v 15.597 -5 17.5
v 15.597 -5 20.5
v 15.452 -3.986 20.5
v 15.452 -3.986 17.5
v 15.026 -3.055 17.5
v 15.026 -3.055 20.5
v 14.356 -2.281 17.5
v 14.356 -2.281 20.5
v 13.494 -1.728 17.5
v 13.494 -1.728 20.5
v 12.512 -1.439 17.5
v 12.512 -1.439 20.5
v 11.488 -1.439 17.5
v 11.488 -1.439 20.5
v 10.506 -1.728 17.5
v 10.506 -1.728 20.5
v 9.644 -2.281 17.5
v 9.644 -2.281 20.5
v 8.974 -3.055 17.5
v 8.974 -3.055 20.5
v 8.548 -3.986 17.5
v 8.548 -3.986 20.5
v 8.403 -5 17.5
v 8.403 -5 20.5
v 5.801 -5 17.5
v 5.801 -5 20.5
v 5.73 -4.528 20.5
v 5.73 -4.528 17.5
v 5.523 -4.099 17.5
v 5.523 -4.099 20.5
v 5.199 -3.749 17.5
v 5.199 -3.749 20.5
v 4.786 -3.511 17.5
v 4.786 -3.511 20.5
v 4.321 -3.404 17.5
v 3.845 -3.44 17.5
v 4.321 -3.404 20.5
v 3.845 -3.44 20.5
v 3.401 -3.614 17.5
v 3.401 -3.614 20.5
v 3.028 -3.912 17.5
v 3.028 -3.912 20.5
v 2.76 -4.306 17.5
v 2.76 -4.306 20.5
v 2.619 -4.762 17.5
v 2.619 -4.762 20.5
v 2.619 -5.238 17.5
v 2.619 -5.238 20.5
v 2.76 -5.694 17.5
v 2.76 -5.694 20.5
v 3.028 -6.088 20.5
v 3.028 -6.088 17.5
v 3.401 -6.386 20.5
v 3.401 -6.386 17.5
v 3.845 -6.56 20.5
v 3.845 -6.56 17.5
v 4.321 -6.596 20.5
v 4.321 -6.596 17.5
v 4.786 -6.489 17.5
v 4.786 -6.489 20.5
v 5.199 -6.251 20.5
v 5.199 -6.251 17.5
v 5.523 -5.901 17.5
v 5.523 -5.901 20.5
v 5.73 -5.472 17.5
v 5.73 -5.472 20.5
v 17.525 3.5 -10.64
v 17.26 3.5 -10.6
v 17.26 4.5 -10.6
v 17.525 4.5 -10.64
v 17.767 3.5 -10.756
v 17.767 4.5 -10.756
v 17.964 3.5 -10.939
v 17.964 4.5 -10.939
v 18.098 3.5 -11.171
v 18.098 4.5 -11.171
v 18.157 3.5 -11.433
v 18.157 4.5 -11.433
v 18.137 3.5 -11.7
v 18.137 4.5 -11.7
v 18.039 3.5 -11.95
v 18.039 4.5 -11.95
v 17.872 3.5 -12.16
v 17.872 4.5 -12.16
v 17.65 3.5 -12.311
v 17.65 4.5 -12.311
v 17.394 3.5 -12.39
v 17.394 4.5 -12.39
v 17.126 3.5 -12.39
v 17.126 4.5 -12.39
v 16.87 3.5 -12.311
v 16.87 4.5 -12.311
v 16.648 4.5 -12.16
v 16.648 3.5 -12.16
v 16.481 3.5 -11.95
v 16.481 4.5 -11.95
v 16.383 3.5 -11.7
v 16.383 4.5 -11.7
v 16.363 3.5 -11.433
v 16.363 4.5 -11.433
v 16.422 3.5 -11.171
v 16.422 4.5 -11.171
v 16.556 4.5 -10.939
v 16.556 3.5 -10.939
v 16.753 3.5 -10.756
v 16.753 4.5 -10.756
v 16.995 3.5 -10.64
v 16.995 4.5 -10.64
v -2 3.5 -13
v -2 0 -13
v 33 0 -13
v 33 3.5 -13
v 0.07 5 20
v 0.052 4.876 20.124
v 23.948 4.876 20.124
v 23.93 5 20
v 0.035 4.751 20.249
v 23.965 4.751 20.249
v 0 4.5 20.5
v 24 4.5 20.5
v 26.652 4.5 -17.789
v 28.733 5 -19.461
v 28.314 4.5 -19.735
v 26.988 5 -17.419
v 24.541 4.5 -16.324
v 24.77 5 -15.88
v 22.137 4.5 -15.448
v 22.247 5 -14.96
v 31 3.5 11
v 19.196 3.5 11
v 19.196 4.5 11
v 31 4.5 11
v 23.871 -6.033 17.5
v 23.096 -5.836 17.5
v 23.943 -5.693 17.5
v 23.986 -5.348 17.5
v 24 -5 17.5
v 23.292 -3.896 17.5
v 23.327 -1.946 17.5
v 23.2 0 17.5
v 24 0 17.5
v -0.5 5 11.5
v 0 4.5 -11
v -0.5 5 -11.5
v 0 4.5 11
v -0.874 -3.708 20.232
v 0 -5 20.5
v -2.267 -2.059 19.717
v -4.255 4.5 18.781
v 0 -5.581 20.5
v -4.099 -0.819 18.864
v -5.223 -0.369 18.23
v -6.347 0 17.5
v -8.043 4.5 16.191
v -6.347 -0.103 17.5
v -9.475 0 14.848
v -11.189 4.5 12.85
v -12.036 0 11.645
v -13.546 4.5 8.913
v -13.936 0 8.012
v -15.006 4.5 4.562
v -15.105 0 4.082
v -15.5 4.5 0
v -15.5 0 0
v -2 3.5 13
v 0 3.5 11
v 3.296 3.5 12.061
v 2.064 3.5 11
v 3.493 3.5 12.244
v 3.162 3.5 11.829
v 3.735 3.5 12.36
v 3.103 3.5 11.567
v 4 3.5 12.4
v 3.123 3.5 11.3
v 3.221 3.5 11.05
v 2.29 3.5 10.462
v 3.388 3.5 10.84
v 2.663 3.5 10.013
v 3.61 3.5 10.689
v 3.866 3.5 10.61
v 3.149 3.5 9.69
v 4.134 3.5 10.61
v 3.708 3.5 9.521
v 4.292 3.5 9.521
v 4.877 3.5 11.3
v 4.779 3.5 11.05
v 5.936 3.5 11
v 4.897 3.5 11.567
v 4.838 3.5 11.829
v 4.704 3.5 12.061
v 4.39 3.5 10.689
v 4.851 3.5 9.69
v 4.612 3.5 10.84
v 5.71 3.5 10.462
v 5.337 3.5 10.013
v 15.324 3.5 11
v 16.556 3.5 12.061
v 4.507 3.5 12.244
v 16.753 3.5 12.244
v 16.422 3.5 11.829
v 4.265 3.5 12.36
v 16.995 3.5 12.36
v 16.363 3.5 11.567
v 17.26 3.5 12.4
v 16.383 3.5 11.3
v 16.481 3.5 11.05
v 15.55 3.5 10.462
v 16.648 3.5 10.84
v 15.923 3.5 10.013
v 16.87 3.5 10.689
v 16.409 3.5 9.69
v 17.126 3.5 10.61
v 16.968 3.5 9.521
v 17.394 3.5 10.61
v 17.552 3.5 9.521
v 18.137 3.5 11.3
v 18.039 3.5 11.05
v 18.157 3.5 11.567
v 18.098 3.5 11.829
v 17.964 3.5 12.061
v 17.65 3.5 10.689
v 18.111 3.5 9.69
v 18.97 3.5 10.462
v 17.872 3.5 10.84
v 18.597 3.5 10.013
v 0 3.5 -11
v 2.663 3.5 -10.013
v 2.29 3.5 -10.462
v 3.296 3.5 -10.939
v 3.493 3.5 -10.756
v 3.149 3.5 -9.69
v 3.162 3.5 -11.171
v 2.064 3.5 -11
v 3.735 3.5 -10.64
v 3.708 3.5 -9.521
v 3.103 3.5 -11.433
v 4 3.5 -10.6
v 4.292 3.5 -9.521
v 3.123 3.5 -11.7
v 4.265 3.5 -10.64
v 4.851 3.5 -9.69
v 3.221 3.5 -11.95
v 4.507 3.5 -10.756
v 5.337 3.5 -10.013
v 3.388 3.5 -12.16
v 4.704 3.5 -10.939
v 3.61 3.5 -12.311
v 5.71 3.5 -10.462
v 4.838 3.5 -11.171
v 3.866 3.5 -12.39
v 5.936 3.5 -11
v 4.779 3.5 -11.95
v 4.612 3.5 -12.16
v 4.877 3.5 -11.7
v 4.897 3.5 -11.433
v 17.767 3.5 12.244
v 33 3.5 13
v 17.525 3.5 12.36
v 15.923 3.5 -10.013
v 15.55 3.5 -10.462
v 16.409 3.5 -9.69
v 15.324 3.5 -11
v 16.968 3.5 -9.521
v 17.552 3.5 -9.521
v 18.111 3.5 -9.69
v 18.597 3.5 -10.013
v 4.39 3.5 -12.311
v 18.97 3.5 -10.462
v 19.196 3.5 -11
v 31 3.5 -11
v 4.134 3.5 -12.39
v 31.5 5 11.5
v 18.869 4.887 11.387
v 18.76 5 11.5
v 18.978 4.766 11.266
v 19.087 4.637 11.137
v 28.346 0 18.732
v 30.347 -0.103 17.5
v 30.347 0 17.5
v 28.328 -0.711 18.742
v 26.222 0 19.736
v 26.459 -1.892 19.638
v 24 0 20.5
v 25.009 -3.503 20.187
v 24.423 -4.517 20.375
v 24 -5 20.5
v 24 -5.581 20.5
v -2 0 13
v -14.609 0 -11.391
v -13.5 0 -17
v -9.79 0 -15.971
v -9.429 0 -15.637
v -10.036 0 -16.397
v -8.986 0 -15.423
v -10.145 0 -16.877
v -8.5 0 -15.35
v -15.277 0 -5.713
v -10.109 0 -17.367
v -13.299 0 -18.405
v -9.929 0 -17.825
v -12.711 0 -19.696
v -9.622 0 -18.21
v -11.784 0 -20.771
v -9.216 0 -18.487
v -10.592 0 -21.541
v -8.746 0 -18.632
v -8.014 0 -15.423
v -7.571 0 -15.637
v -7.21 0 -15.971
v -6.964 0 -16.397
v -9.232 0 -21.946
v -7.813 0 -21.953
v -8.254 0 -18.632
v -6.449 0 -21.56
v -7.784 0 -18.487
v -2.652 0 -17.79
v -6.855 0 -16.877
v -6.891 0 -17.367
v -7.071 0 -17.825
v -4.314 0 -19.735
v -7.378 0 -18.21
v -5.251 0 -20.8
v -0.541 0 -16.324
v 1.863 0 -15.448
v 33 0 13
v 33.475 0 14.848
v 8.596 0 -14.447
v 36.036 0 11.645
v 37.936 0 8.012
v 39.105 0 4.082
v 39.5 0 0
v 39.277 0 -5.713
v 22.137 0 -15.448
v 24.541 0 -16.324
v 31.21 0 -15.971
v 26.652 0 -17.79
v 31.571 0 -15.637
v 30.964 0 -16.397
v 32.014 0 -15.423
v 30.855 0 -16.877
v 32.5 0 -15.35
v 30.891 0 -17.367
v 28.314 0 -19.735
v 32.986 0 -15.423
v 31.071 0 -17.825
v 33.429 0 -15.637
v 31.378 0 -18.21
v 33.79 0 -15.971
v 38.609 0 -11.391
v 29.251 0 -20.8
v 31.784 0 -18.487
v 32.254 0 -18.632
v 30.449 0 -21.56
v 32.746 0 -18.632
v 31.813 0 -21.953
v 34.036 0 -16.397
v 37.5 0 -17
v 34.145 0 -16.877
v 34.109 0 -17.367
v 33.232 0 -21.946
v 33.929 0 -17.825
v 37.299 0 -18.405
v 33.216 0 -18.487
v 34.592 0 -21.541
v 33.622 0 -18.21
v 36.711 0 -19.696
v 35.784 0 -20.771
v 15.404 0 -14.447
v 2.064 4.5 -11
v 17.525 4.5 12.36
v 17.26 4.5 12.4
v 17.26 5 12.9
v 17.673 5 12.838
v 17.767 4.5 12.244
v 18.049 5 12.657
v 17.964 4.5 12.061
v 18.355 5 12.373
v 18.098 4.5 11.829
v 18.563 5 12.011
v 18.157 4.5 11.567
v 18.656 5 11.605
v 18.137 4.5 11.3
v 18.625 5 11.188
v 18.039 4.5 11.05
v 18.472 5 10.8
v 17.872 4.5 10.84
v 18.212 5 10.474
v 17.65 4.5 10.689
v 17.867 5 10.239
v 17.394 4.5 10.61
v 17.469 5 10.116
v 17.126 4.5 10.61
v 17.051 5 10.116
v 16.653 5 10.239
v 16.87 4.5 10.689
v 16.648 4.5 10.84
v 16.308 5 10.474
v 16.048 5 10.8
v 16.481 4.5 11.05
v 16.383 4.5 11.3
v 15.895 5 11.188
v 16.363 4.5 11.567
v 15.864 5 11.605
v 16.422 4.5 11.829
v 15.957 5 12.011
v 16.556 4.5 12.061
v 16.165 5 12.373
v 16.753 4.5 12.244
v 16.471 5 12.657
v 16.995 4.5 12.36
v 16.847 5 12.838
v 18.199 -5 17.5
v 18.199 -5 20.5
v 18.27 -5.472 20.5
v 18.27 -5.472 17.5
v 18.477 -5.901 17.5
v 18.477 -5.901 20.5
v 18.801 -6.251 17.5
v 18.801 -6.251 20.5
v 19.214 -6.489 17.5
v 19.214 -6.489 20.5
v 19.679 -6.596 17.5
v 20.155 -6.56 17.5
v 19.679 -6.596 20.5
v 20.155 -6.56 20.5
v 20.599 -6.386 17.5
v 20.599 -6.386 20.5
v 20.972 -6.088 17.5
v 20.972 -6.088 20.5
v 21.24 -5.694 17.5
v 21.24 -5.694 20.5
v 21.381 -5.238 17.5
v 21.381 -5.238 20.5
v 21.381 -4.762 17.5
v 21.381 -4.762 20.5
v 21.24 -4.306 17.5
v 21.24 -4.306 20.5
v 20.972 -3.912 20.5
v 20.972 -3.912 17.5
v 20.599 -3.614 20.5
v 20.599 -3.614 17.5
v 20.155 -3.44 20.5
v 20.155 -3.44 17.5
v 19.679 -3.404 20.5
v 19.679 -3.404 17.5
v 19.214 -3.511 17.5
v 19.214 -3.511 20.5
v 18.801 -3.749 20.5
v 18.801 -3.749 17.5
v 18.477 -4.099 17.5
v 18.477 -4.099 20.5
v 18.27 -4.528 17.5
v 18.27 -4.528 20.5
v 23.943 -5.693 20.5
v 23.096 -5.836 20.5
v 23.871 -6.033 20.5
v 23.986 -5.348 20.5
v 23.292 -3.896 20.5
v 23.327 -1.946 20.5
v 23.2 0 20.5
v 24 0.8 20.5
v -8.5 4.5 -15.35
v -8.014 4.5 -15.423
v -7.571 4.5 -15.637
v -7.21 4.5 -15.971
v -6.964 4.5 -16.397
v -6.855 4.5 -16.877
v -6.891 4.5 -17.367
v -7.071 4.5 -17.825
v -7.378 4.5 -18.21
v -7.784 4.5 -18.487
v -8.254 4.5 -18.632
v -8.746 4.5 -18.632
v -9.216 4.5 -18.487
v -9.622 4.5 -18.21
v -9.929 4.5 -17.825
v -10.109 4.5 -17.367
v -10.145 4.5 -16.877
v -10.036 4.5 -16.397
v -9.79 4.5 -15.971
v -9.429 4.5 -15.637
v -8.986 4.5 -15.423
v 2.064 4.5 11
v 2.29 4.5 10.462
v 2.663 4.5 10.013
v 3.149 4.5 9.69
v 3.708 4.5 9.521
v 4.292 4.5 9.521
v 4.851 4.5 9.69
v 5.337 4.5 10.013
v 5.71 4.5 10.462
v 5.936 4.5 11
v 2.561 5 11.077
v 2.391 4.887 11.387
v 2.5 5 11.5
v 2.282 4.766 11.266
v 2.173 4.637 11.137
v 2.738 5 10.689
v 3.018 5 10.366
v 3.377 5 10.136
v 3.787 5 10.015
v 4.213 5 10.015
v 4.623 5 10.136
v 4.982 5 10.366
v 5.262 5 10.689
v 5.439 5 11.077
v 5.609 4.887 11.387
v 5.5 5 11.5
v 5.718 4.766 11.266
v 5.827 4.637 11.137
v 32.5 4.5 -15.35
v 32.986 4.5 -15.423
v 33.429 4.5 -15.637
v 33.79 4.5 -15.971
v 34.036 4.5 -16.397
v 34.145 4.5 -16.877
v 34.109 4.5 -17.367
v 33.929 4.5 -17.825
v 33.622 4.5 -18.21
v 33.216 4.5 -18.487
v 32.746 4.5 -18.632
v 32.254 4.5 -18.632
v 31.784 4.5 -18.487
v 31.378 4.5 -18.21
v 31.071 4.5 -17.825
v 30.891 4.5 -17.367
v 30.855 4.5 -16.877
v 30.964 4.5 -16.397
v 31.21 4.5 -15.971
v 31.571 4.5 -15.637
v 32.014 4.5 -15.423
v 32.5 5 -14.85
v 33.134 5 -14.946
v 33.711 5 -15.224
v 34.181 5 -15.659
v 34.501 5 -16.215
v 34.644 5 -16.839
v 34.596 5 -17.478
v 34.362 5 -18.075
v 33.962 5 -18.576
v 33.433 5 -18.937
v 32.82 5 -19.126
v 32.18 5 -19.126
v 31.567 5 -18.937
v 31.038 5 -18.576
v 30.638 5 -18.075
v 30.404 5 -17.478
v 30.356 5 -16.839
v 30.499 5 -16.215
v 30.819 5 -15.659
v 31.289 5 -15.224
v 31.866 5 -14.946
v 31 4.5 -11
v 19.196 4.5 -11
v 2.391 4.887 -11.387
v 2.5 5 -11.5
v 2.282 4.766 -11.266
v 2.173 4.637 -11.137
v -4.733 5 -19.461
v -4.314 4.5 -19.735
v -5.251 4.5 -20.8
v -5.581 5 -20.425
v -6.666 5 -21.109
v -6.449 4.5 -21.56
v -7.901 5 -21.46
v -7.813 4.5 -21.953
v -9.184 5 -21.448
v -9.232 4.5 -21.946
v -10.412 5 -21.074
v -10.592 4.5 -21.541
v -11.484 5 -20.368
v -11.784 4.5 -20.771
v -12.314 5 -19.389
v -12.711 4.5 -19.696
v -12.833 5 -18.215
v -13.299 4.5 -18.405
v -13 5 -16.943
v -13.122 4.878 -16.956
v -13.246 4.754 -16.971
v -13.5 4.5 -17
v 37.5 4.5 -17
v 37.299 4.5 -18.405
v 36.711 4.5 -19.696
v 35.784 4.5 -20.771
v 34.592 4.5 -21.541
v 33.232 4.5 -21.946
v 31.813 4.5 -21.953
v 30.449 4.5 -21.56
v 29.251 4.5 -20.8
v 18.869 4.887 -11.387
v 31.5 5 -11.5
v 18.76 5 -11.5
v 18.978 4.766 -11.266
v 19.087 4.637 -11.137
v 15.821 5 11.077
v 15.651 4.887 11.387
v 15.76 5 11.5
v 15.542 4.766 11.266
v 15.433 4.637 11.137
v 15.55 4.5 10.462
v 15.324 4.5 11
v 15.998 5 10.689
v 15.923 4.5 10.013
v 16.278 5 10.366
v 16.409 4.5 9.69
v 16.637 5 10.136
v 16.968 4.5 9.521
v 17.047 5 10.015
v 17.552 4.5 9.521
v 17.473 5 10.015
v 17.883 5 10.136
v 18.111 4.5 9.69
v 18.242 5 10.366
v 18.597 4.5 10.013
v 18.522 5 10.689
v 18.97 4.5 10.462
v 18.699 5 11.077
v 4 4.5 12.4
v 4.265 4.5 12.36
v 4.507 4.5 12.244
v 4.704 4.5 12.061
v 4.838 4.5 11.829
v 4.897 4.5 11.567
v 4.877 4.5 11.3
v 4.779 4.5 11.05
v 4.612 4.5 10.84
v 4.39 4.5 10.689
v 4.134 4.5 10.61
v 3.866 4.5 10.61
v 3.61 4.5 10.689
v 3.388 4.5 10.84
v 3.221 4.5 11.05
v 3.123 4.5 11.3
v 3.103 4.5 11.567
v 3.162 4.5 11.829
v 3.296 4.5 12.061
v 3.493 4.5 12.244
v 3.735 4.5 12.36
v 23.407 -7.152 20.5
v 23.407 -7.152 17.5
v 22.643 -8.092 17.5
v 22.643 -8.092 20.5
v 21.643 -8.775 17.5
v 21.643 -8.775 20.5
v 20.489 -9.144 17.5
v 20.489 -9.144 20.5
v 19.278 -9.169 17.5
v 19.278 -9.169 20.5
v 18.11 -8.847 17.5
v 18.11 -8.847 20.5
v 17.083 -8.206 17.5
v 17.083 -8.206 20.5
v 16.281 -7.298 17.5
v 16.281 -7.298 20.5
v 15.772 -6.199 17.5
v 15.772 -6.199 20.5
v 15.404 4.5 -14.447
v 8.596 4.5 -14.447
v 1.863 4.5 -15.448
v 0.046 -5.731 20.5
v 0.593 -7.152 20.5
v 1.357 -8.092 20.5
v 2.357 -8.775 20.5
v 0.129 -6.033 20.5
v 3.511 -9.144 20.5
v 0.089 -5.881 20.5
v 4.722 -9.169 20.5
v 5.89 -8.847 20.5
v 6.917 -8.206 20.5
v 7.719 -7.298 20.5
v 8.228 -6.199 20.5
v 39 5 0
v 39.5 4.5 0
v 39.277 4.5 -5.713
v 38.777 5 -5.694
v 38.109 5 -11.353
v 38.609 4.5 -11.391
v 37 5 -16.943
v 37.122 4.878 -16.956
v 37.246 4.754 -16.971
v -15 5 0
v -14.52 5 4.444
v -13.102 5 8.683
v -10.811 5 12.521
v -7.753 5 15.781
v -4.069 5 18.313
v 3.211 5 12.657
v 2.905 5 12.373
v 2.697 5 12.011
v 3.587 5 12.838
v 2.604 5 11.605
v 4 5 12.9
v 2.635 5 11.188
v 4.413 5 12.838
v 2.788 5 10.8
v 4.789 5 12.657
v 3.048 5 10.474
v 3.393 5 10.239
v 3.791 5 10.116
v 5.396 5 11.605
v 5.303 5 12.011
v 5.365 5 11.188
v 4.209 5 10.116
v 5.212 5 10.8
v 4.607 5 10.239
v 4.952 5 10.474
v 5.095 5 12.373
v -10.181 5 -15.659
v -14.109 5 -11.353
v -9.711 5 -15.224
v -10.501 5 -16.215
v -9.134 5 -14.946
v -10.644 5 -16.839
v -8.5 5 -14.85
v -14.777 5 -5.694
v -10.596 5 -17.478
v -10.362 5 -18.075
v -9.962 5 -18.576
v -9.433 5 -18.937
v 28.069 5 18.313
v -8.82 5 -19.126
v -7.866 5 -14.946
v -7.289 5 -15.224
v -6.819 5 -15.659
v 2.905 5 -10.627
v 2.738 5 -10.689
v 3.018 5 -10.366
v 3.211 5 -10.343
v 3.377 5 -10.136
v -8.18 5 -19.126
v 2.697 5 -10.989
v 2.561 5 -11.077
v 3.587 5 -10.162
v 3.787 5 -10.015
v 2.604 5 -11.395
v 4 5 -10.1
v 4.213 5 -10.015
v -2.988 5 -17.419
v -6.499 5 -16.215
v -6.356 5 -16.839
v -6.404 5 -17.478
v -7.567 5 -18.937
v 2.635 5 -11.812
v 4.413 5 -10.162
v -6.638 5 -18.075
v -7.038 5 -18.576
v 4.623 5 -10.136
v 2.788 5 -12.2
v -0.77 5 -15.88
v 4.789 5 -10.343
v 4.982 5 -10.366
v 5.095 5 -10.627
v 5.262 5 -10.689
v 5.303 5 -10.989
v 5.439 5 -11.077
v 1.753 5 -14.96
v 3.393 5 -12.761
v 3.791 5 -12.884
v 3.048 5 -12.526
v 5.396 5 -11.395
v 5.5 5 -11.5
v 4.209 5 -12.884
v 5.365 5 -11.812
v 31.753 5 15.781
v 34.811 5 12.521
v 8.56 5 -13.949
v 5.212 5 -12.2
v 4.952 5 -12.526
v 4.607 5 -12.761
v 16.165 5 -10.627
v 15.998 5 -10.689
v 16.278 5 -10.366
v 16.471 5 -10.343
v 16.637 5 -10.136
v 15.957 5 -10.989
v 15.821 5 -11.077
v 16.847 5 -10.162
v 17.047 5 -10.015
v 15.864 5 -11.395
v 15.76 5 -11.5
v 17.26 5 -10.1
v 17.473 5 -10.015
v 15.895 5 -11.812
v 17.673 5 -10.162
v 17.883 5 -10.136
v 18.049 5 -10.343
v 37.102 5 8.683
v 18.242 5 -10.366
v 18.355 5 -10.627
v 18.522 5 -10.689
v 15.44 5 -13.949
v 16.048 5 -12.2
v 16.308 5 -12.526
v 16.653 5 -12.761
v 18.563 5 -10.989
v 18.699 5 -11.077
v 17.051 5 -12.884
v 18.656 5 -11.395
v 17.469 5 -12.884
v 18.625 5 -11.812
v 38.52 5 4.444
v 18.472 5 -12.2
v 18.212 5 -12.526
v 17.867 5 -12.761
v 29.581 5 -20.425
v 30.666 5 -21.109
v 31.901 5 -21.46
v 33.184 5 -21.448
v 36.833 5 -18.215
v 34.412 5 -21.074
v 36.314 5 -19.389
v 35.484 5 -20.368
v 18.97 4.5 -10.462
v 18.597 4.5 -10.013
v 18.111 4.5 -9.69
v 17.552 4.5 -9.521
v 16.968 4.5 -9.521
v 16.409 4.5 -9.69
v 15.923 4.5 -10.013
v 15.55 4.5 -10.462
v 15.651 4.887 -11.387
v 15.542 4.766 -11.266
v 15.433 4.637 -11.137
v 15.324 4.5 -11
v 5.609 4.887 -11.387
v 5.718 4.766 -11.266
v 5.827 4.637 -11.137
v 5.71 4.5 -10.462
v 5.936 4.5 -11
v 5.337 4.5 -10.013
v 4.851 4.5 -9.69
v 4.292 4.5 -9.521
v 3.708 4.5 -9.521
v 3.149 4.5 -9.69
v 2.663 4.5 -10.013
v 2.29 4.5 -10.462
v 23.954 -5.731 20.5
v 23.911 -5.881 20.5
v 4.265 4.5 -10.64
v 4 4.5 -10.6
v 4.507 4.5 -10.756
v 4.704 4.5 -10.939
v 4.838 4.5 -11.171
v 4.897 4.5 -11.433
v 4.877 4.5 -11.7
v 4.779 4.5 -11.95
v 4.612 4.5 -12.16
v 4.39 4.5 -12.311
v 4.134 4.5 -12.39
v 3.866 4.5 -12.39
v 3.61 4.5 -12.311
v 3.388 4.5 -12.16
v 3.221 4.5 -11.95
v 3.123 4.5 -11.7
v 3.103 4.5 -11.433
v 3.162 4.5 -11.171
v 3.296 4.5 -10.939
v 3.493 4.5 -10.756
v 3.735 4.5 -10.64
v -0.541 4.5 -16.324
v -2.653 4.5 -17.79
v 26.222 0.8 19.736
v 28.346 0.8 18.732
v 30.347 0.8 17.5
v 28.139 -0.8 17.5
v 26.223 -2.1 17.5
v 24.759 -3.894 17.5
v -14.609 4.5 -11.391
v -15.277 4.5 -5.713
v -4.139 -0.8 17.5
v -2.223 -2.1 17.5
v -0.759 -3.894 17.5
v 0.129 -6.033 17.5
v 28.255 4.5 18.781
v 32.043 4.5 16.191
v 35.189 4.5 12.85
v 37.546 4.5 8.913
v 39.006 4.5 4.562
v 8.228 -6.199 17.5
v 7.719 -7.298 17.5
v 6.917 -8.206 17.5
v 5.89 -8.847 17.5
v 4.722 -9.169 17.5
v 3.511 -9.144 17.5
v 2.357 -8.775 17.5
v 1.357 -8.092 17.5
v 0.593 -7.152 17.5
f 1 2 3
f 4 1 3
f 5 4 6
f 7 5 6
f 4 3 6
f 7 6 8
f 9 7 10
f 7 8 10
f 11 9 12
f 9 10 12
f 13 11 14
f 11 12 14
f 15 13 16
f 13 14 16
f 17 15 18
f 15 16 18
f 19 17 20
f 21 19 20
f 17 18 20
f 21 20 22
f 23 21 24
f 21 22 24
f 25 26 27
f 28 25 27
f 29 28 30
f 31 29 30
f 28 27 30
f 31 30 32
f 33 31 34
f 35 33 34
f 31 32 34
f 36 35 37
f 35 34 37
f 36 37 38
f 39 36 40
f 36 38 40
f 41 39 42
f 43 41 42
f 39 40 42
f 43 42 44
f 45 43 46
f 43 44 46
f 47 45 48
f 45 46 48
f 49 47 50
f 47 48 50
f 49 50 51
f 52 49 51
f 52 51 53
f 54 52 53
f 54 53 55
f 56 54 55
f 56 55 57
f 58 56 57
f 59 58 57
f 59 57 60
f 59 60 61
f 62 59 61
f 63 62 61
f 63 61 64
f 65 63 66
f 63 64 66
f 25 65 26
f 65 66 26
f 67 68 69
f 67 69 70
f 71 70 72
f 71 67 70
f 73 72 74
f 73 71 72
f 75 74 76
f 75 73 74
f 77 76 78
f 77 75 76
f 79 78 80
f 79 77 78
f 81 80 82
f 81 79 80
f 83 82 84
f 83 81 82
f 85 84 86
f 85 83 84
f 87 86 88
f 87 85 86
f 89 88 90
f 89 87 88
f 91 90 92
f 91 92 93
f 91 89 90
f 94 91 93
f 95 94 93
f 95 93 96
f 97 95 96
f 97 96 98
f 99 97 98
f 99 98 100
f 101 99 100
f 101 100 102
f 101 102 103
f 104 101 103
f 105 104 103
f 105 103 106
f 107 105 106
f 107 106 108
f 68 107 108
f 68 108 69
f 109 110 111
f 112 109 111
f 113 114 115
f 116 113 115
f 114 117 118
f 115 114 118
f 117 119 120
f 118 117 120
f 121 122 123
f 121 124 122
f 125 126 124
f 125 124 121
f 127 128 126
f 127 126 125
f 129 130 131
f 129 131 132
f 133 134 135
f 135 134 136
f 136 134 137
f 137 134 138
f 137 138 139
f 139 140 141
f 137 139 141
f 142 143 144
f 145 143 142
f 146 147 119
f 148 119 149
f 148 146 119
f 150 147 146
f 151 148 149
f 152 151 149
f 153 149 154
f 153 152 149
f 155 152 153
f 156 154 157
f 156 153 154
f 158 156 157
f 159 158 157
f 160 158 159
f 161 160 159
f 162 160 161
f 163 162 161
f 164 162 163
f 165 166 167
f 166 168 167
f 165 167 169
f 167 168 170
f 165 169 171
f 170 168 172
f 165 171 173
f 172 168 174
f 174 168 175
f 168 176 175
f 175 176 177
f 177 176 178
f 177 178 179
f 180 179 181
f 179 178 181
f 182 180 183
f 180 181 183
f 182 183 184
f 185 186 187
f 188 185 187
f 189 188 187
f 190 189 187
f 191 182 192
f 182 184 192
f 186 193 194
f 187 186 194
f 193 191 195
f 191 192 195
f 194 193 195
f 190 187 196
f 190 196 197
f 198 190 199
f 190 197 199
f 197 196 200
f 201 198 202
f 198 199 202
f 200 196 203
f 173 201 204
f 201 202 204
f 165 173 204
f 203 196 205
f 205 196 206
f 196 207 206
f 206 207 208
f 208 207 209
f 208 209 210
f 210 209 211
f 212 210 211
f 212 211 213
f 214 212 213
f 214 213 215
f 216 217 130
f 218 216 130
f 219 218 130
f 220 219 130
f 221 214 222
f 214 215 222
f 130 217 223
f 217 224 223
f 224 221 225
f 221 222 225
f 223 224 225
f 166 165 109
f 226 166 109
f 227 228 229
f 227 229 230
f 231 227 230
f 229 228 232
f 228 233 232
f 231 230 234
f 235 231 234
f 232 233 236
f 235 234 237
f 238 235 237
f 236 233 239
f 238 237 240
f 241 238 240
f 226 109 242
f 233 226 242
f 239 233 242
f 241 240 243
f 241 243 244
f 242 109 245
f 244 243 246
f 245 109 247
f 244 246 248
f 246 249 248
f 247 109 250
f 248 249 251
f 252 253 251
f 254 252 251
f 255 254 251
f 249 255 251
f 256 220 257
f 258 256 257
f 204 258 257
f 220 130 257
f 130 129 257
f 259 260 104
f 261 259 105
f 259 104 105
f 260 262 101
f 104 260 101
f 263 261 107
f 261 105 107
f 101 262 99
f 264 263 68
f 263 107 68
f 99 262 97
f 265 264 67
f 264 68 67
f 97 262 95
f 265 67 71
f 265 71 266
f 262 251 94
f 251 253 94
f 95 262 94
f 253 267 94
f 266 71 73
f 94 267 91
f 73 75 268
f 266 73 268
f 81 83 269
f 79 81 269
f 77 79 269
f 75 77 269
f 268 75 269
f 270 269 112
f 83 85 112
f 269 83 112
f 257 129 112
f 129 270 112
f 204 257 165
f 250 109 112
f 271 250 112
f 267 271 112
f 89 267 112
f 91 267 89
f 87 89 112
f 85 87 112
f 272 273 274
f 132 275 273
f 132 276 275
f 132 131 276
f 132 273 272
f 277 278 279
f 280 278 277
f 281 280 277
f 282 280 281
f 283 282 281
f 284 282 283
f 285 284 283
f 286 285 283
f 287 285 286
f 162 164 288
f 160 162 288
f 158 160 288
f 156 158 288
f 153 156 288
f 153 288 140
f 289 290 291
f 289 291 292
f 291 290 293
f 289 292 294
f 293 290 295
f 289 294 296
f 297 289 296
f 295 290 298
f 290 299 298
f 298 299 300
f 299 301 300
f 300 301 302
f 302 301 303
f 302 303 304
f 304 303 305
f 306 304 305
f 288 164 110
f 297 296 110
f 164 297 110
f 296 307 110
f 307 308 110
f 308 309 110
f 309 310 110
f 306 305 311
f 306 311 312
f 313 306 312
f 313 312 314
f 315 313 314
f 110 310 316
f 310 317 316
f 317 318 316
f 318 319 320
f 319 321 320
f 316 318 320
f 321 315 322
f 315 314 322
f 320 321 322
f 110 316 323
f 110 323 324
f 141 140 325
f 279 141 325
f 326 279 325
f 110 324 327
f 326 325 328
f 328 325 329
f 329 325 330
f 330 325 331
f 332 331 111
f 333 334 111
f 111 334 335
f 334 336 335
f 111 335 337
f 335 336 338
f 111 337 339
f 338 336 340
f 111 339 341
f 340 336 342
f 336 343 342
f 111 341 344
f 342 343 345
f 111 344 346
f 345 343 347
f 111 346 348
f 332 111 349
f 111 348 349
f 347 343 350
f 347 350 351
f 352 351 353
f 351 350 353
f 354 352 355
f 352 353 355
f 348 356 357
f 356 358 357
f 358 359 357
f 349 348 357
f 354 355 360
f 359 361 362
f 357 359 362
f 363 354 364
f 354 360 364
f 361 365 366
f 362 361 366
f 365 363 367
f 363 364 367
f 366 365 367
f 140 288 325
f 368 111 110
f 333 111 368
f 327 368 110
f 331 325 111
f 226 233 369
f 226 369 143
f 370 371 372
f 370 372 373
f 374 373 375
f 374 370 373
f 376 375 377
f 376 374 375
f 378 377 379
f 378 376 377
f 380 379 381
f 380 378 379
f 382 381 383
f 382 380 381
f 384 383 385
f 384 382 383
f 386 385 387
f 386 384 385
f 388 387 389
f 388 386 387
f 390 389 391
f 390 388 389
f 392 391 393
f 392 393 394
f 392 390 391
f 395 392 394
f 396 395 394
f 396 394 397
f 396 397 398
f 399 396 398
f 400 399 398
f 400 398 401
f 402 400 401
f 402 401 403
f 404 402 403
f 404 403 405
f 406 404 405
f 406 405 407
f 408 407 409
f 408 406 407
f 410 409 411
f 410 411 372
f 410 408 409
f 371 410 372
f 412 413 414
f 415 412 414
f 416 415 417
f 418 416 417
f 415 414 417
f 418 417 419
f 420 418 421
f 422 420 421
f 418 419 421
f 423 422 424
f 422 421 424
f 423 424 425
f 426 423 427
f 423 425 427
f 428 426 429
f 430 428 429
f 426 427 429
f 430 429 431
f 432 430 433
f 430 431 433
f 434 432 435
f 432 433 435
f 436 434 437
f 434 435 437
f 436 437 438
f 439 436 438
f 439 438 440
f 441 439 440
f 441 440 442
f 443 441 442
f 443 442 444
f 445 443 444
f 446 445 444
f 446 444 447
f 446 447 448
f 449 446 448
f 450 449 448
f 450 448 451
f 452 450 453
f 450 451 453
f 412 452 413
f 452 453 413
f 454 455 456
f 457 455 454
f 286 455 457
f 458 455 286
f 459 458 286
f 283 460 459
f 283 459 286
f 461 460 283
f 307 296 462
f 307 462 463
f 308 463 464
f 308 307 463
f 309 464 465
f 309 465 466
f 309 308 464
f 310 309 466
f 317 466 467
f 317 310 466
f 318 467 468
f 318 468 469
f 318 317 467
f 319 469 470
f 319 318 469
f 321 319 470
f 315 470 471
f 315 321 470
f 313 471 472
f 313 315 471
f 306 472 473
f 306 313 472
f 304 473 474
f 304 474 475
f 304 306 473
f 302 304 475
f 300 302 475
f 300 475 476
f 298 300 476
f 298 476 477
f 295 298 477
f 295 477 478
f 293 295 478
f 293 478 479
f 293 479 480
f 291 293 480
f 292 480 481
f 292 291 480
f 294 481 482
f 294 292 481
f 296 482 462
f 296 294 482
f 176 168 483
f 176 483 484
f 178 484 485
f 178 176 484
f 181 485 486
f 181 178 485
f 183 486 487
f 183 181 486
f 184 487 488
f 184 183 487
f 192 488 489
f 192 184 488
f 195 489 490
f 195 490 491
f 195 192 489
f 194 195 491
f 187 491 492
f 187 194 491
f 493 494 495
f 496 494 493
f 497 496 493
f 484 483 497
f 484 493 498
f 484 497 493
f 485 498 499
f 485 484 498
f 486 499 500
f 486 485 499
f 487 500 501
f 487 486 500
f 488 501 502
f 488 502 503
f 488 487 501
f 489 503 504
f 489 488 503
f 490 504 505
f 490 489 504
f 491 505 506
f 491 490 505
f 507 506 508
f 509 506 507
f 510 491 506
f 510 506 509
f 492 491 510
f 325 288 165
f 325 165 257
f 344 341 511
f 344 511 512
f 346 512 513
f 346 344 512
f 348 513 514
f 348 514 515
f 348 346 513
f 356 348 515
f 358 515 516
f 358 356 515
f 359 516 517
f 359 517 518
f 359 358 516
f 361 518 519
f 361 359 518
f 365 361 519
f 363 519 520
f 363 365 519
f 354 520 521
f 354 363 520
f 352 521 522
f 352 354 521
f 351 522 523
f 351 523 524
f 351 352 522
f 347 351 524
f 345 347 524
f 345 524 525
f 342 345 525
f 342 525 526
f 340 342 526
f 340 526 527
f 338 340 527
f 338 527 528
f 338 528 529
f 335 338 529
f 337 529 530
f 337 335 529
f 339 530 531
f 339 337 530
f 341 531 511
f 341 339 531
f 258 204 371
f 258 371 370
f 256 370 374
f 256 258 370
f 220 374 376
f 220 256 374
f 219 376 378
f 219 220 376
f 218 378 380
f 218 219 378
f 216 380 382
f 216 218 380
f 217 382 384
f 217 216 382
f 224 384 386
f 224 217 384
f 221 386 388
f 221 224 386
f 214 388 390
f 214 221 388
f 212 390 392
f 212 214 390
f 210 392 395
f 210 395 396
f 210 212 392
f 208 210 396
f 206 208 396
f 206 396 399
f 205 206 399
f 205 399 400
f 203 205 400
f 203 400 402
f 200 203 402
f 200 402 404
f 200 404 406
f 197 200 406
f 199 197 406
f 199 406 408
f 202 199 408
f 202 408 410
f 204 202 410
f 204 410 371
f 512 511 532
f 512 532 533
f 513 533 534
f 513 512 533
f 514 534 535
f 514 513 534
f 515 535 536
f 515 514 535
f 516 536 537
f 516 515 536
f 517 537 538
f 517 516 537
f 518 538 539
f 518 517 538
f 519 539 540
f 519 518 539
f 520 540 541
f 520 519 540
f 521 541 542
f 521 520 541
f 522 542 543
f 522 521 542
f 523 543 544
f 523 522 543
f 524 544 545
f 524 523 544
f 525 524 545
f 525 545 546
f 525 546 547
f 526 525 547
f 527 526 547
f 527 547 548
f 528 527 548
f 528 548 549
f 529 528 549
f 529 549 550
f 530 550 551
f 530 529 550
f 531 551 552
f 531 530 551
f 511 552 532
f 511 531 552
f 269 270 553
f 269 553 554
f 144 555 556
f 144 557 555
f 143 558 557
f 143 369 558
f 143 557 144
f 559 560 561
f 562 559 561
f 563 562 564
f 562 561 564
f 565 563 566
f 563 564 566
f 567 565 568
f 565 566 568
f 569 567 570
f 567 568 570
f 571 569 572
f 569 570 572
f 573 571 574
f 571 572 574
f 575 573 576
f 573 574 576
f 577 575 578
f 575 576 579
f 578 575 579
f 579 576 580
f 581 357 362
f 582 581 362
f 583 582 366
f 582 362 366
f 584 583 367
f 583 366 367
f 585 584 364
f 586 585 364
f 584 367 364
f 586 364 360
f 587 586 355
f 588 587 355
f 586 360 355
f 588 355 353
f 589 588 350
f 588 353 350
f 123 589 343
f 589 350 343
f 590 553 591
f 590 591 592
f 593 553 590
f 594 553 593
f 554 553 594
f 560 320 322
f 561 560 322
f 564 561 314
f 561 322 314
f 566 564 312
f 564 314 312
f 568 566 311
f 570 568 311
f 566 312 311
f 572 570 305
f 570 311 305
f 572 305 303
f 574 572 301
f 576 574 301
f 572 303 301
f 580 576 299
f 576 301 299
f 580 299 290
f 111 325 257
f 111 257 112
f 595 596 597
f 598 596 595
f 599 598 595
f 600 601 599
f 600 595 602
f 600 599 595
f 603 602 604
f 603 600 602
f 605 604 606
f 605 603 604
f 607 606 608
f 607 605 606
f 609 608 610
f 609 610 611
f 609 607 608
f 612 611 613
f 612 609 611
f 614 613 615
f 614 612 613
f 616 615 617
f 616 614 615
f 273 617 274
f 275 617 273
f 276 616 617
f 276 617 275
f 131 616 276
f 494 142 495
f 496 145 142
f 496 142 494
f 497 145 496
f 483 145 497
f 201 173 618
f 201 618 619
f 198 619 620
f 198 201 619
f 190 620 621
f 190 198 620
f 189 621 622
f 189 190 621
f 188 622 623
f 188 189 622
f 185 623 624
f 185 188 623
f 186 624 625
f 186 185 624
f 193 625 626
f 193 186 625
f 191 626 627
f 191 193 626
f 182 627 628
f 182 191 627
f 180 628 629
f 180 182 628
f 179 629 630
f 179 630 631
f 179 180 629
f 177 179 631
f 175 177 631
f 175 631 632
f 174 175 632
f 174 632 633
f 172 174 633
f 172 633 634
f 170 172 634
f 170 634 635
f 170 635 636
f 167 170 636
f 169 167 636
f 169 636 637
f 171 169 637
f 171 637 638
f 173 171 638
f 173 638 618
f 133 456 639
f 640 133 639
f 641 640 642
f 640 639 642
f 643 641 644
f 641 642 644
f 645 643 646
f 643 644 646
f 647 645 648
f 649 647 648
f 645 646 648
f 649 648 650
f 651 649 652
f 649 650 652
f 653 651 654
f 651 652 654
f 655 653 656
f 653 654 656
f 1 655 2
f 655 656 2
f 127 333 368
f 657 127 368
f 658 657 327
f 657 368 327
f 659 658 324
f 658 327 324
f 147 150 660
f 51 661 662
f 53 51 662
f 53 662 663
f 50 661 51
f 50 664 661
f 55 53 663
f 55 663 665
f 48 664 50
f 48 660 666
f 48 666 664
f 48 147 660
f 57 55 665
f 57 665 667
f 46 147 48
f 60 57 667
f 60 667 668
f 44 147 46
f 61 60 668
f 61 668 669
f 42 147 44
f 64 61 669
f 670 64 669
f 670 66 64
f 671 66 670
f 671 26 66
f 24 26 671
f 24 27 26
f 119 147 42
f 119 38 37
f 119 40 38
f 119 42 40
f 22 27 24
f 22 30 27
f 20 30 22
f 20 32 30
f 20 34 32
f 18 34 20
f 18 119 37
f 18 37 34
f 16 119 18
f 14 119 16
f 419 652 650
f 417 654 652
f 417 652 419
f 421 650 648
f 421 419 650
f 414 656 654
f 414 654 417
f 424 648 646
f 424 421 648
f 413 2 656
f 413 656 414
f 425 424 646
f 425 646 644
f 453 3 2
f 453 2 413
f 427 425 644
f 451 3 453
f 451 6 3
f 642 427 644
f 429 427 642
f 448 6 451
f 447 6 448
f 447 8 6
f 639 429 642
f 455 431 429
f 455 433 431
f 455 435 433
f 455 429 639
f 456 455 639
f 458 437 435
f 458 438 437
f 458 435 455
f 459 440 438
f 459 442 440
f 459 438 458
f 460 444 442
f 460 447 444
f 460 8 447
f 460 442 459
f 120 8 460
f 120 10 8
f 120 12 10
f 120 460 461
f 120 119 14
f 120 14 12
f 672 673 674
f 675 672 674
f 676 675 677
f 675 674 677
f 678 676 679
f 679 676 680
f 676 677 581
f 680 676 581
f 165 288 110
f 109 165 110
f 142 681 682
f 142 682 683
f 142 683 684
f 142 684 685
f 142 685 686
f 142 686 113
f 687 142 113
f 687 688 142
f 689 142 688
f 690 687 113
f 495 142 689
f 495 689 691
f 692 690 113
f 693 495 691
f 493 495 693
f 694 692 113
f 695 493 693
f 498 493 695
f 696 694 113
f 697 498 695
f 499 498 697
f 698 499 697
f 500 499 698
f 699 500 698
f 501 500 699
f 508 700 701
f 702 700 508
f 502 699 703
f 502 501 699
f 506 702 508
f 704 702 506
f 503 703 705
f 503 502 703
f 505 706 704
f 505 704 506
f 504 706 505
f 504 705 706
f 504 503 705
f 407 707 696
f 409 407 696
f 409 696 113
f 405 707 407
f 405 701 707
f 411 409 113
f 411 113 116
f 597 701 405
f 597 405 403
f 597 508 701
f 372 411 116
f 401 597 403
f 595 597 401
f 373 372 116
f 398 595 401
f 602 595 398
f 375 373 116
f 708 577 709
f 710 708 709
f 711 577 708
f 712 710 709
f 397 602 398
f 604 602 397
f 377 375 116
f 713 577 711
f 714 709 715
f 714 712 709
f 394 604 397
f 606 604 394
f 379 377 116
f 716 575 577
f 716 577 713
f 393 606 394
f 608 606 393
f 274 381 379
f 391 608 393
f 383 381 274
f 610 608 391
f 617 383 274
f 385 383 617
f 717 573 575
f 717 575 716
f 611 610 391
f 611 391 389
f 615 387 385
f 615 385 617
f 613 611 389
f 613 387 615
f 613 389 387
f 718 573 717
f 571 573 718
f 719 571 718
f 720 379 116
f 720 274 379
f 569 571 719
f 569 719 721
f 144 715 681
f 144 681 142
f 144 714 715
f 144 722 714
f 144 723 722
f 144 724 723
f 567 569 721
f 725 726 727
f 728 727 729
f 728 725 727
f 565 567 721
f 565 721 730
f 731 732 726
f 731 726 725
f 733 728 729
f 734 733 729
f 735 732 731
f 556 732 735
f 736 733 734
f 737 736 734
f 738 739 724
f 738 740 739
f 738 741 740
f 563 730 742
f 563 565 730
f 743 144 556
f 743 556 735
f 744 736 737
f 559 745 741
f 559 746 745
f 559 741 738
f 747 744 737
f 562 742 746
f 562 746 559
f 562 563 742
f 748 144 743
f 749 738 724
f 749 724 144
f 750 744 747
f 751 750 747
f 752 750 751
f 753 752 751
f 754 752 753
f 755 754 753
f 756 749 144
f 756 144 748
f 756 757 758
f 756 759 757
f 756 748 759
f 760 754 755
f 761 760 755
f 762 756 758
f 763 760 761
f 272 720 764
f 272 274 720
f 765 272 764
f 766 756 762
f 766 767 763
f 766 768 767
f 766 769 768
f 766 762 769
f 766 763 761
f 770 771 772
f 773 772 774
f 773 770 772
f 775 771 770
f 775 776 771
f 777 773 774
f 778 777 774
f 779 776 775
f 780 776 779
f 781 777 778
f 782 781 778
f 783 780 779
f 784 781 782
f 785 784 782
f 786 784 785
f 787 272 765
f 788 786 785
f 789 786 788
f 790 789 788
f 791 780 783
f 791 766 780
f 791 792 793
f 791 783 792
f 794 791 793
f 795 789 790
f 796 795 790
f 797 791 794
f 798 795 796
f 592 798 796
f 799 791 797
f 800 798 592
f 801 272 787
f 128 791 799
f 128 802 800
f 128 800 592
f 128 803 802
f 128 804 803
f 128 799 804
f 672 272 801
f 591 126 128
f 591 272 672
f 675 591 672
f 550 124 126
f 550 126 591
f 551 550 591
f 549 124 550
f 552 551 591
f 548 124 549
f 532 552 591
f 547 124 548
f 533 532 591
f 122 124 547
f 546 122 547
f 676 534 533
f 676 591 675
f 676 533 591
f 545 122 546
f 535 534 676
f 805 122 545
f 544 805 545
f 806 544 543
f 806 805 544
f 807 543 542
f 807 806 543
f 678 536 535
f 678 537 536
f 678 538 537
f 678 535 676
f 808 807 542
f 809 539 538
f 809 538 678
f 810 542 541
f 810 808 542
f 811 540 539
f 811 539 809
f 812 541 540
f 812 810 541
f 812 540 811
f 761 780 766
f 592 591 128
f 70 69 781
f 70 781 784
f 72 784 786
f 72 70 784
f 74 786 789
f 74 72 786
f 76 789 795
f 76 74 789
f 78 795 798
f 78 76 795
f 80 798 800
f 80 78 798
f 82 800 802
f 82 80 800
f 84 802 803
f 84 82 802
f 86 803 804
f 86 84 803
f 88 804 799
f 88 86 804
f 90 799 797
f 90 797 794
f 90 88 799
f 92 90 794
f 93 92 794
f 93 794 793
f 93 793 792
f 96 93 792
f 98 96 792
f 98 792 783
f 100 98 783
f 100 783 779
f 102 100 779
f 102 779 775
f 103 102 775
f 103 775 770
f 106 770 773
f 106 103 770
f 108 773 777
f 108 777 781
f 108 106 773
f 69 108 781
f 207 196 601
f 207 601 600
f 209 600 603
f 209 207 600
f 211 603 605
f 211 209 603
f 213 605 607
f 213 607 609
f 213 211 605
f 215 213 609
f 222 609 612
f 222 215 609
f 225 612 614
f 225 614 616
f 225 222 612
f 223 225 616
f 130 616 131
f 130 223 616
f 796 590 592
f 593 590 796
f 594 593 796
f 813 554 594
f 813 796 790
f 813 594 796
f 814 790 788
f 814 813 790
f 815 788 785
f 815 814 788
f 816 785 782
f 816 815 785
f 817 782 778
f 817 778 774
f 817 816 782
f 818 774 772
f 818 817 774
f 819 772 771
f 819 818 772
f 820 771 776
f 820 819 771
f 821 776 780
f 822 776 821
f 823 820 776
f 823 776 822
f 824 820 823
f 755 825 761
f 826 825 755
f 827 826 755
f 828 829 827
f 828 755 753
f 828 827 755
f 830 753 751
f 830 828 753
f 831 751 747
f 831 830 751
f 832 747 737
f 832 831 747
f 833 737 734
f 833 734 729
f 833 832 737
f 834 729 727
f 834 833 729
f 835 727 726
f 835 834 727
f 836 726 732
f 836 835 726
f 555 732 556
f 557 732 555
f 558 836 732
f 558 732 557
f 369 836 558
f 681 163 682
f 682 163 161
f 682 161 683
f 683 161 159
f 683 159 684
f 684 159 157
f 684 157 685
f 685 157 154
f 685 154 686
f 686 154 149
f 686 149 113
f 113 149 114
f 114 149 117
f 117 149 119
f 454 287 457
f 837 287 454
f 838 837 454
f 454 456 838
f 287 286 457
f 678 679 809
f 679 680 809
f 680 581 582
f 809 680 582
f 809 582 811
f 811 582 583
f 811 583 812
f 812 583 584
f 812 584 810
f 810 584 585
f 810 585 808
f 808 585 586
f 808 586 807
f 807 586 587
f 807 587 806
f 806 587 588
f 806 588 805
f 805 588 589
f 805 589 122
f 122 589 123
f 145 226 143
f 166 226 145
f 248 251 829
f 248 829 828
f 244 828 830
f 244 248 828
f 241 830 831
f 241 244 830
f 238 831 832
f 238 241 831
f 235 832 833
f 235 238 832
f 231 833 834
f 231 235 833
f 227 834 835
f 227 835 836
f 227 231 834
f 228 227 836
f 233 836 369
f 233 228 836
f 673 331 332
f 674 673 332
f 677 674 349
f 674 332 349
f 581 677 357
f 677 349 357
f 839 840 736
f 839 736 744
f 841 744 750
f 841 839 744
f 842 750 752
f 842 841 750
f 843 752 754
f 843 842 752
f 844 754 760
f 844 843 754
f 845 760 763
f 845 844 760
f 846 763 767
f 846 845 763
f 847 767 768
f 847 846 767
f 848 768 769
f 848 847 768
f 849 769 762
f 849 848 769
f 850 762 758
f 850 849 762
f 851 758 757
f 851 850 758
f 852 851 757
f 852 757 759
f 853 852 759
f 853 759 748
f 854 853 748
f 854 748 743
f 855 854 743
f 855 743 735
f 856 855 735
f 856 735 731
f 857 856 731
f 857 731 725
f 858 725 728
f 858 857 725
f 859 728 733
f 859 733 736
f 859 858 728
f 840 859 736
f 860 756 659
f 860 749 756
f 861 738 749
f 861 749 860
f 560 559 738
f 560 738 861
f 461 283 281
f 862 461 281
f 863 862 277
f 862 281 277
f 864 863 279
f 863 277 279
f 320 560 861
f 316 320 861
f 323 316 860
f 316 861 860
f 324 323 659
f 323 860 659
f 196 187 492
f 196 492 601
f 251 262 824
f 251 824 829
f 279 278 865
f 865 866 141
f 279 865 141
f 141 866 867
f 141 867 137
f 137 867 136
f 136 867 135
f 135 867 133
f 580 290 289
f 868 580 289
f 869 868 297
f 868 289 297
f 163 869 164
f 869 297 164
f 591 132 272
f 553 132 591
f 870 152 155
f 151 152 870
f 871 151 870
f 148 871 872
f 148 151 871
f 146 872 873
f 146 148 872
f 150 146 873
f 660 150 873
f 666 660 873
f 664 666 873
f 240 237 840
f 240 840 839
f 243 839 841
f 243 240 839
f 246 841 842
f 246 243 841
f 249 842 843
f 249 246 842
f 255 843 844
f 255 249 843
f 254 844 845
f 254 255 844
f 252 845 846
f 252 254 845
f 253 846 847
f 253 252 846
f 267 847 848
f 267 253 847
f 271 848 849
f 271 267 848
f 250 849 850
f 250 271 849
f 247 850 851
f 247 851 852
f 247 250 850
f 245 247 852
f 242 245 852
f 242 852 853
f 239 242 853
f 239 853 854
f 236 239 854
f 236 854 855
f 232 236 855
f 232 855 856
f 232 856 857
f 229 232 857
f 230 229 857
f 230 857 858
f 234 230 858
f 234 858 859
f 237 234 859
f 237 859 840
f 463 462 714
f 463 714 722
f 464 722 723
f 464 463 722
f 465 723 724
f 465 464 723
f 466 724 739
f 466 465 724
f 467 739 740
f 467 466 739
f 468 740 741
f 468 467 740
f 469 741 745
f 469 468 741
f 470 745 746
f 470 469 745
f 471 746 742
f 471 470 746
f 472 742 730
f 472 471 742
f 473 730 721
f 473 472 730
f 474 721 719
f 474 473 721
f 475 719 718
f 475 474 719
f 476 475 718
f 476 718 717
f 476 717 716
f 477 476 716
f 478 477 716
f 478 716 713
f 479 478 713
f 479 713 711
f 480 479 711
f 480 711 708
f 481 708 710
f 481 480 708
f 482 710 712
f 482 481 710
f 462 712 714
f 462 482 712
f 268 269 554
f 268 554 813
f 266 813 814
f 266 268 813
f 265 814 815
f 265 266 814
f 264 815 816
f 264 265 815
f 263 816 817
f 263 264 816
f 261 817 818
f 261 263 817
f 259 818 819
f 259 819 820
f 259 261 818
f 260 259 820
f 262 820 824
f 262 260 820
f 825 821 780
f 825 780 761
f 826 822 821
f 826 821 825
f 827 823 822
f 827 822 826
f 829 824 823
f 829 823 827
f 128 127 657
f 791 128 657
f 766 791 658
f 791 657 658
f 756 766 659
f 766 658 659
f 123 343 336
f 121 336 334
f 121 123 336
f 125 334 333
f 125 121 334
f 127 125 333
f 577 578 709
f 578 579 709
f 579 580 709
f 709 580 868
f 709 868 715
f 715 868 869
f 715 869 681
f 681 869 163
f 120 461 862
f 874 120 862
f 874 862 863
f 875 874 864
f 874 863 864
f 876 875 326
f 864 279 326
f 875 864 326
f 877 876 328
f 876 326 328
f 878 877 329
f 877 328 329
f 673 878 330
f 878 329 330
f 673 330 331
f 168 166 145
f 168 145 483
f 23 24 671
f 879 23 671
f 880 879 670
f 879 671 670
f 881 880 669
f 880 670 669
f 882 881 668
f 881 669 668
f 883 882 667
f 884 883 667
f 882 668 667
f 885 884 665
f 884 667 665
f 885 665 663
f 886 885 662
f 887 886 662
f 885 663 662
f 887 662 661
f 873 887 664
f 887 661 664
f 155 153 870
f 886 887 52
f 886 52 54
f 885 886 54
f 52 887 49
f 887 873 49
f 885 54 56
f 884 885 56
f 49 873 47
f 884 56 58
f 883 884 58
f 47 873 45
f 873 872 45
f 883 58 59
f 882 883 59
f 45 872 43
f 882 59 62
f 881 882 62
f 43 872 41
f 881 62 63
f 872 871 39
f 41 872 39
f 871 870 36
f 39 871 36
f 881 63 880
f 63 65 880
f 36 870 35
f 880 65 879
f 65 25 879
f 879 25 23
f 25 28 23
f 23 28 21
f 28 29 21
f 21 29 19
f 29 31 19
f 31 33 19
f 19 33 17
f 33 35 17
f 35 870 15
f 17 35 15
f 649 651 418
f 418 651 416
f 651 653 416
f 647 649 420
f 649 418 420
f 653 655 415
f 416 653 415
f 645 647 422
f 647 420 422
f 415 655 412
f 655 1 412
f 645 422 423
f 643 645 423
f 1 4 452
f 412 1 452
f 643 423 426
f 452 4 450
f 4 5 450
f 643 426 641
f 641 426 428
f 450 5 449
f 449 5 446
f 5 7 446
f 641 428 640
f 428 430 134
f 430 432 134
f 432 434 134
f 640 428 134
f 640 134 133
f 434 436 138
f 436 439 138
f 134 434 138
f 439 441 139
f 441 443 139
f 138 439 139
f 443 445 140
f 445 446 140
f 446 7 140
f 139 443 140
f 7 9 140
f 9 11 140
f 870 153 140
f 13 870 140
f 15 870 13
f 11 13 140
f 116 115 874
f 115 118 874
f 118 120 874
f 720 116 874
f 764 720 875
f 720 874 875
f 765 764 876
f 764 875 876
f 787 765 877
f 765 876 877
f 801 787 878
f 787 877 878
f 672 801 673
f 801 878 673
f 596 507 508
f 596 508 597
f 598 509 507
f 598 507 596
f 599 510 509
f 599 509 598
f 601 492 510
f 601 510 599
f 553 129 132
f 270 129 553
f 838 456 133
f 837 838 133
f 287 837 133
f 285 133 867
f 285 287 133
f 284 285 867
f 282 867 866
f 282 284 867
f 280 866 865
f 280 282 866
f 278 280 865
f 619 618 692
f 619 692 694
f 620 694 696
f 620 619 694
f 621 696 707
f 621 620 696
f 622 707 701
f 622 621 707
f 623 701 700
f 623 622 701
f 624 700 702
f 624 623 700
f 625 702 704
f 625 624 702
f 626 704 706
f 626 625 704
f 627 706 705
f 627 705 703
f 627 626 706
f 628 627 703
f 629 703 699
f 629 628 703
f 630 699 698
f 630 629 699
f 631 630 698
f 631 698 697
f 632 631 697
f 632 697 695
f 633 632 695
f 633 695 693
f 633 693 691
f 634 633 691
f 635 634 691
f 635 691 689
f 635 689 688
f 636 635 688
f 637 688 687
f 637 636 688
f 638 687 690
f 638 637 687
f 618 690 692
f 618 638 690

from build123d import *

# Parameters (mm, degrees)
COMPLETE_SKETCH_R               = 1.6
COMPLETE_SKETCH_R_2             = 1.65
BODY_DEPTH                      = 5
SMOOTHING_FILLET_R              = 10
CUT_EXTRUDE1_START              = -5
SKETCH1_R                       = 0.9
CUT_EXTRUDE1_DEPTH              = 5
CUT_EXTRUDE2_START              = -5
SKETCH1_4_W                     = 35
SKETCH1_4_H                     = 26
CUT_EXTRUDE2_DEPTH              = 3.5
ELEPHANTSFOOT_COMPENSATION_SIZE = 0.5
SKETCH5_R                       = 1.6
BOSS_EXTRUDE3_DEPTH             = 3
FILLET3_R                       = 8


with BuildPart() as part:
    # complete_sketch → body (new body)
    with BuildSketch(Plane(origin=(0, 0, 0), x_dir=(1, 0, 0), z_dir=(0, 1, 0))):
        with BuildLine():
            Line((0, -20.5), (24, -20.5))
            ThreePointArc((24, -20.5), (35.188838333, -12.850097276), (39.5, 0))
            ThreePointArc((39.5, 0), (38.998281767, 8.558621384), (37.5, 17))
            ThreePointArc((37.5, 17), (32.5, 22), (27.5, 17))
            ThreePointArc((27.5, 17), (12, 14.321592614), (-3.5, 17))
            ThreePointArc((-3.5, 17), (-8.5, 22), (-13.5, 17))
            ThreePointArc((-13.5, 17), (-14.998281767, 8.558621384), (-15.5, 0))
            ThreePointArc((-15.5, 0), (-11.188838333, -12.850097276), (0, -20.5))
        make_face()
        with Locations(Location((24, 0, 0), (0, 0, 270))):
            Circle(COMPLETE_SKETCH_R, mode=Mode.SUBTRACT)
        with Locations(Location((-8.5, 17, 0), (0, 0, 270))):
            Circle(COMPLETE_SKETCH_R_2, mode=Mode.SUBTRACT)
        with Locations(Location((32.5, 17, 0), (0, 0, 270))):
            Circle(COMPLETE_SKETCH_R_2, mode=Mode.SUBTRACT)
    extrude(amount=BODY_DEPTH)

    # smoothing_fillet
    smoothing_fillet_edges = [part.edges().sort_by_distance(p)[0] for p in [
        (-3.5, 2.5, -17),
        (27.5, 2.5, -17),
    ]]
    fillet(smoothing_fillet_edges, radius=SMOOTHING_FILLET_R)

    # Sketch1 → Cut-Extrude1 (cut)
    with BuildSketch(Plane(origin=(0, 5, 0), x_dir=(1, 0, 0), z_dir=(0, 1, 0)).offset(CUT_EXTRUDE1_START)):
        with BuildLine():
            Line((31, -11), (31, 11))
            Line((31, 11), (19.196491673, 11))
            ThreePointArc((19.196491673, 11), (17.26, 9.5), (15.323508327, 11))
            Line((15.323508327, 11), (5.936491673, 11))
            ThreePointArc((5.936491673, 11), (4, 9.5), (2.063508327, 11))
            Line((2.063508327, 11), (0, 11))
            Line((0, 11), (0, -11))
            Line((0, -11), (2.063508327, -11))
            ThreePointArc((2.063508327, -11), (4, -9.5), (5.936491673, -11))
            Line((5.936491673, -11), (15.323508327, -11))
            ThreePointArc((15.323508327, -11), (17.26, -9.5), (19.196491673, -11))
            Line((19.196491673, -11), (31, -11))
        make_face()
        with Locations(Location((4, 11.5, 0), (0, 0, 270))):
            Circle(SKETCH1_R)
        with Locations(Location((17.26, 11.5, 0), (0, 0, 270))):
            Circle(SKETCH1_R)
        with Locations(Location((17.26, -11.5, 0), (0, 0, 270))):
            Circle(SKETCH1_R)
        with Locations(Location((4, -11.5, 0), (0, 0, 270))):
            Circle(SKETCH1_R)
    extrude(amount=CUT_EXTRUDE1_DEPTH, mode=Mode.SUBTRACT)

    # Sketch1<4> → Cut-Extrude2 (cut)
    with BuildSketch(Plane(origin=(0, 5, 0), x_dir=(1, 0, 0), z_dir=(0, 1, 0)).offset(CUT_EXTRUDE2_START)):
        with Locations((15.5, 0)):
            Rectangle(SKETCH1_4_W, SKETCH1_4_H)
    extrude(amount=CUT_EXTRUDE2_DEPTH, mode=Mode.SUBTRACT)

    # elephantsfoot_compensation
    elephantsfoot_compensation_edges = [part.edges().sort_by_distance(p)[0] for p in [
        (33.926618039, 5, -21.792156192),
        (25.643793964, 5, -16.988490587),
        (38.998281767, 5, -8.558621384),
        (12, 5, -14.321592614),
        (35.188838333, 5, 12.850097276),
        (-1.643793964, 5, -16.988490587),
        (12, 5, 20.5),
        (-9.926618039, 5, -21.792156192),
        (-11.188838333, 5, 12.850097276),
        (-14.998281767, 5, -8.558621384),
        (4, 5, 10.6),
        (17.26, 5, 10.6),
        (17.26, 5, 9.5),
        (25.098245837, 5, 11),
        (31, 5, 0),
        (25.098245837, 5, -11),
        (17.26, 5, -9.5),
        (10.63, 5, -11),
        (4, 5, -9.5),
        (1.031754163, 5, -11),
        (0, 5, 0),
        (1.031754163, 5, 11),
        (4, 5, 9.5),
        (10.63, 5, 11),
        (-8.5, 5, -18.65),
        (4, 5, -12.4),
        (17.26, 5, -12.4),
        (32.5, 5, -18.65),
    ]]
    chamfer(elephantsfoot_compensation_edges, length=ELEPHANTSFOOT_COMPENSATION_SIZE)

    # Sketch5 → Boss-Extrude3 (add)
    with BuildSketch(Plane.XY.offset(20.5)):
        with BuildLine():
            Line((0, -5), (0, 0))
            Line((0, 0), (8.402527049, 0))
            Line((8.402527049, 0), (15.597472951, 0))
            Line((15.597472951, 0), (24, 0))
            Line((24, 0), (24, -5))
            ThreePointArc((24, -5), (19.798736476, -9.201263524), (15.597472951, -5))
            ThreePointArc((15.597472951, -5), (12, -1.402527049), (8.402527049, -5))
            ThreePointArc((8.402527049, -5), (4.201263524, -9.201263524), (0, -5))
        make_face()
        with Locations((4.201263524, -5)):
            Circle(SKETCH5_R, mode=Mode.SUBTRACT)
        with Locations(Location((19.798736476, -5, 0), (0, 0, 180))):
            Circle(SKETCH5_R, mode=Mode.SUBTRACT)
    extrude(amount=-BOSS_EXTRUDE3_DEPTH)

    # Fillet3
    # the kernel refuses this fillet: 8 mm, written as the material it adds along each edge
    with BuildSketch(Plane(origin=(0, 0, 20.5), x_dir=(-1, 0, 0), z_dir=(0, 0, -1))) as fillet3_piece_1_section:
        with BuildLine():
            CenterArc((7.625436421, -8), FILLET3_R, 90, 75.766381177)
            Line((-0.128973553, -6.032990604), (-0.90441455, -5.836289664))
            ThreePointArc((-0.90441455, -5.836289664), (-0.8, -5), (-0.8, 0))
            Line((-0.8, 0), (0, 0.8))
            Line((0, 0.8), (7.625436421, 0.8))
            Line((7.625436421, 0.8), (7.625436421, 0))
        make_face()
    fillet3_piece_1 = extrude(amount=3, mode=Mode.PRIVATE)
    fillet3_piece_1 = fillet3_piece_1 & Plane(origin=(5.806451613, -0.853747652, 0), x_dir=(-1, 0, 0), z_dir=(0, -1, 0)) * Cylinder(21.306451613, 37, mode=Mode.PRIVATE)
    add(fillet3_piece_1)
    with BuildSketch(Plane(origin=(24, 0, 20.5), x_dir=(1, 0, 0), z_dir=(0, 0, -1))) as fillet3_piece_2_section:
        with BuildLine():
            CenterArc((7.625436421, 8), FILLET3_R, 194.233618823, 75.766381177)
            Line((-0.128973553, 6.032990604), (-0.90441455, 5.836289664))
            ThreePointArc((-0.90441455, 5.836289664), (-0.8, 5), (-0.8, 0))
            Line((-0.8, 0), (0, -0.8))
            Line((0, -0.8), (7.625436421, -0.8))
            Line((7.625436421, -0.8), (7.625436421, 0))
        make_face()
    fillet3_piece_2 = extrude(amount=3, mode=Mode.PRIVATE)
    fillet3_piece_2 = fillet3_piece_2 & Plane(origin=(18.193548387, -2.088066401, 0), x_dir=(0.27252081756245267, 0, 0.9621498864496595), z_dir=(0, -1, 0)) * Cylinder(21.306451613, 37, mode=Mode.PRIVATE)
    add(fillet3_piece_2)


solid = part.part
